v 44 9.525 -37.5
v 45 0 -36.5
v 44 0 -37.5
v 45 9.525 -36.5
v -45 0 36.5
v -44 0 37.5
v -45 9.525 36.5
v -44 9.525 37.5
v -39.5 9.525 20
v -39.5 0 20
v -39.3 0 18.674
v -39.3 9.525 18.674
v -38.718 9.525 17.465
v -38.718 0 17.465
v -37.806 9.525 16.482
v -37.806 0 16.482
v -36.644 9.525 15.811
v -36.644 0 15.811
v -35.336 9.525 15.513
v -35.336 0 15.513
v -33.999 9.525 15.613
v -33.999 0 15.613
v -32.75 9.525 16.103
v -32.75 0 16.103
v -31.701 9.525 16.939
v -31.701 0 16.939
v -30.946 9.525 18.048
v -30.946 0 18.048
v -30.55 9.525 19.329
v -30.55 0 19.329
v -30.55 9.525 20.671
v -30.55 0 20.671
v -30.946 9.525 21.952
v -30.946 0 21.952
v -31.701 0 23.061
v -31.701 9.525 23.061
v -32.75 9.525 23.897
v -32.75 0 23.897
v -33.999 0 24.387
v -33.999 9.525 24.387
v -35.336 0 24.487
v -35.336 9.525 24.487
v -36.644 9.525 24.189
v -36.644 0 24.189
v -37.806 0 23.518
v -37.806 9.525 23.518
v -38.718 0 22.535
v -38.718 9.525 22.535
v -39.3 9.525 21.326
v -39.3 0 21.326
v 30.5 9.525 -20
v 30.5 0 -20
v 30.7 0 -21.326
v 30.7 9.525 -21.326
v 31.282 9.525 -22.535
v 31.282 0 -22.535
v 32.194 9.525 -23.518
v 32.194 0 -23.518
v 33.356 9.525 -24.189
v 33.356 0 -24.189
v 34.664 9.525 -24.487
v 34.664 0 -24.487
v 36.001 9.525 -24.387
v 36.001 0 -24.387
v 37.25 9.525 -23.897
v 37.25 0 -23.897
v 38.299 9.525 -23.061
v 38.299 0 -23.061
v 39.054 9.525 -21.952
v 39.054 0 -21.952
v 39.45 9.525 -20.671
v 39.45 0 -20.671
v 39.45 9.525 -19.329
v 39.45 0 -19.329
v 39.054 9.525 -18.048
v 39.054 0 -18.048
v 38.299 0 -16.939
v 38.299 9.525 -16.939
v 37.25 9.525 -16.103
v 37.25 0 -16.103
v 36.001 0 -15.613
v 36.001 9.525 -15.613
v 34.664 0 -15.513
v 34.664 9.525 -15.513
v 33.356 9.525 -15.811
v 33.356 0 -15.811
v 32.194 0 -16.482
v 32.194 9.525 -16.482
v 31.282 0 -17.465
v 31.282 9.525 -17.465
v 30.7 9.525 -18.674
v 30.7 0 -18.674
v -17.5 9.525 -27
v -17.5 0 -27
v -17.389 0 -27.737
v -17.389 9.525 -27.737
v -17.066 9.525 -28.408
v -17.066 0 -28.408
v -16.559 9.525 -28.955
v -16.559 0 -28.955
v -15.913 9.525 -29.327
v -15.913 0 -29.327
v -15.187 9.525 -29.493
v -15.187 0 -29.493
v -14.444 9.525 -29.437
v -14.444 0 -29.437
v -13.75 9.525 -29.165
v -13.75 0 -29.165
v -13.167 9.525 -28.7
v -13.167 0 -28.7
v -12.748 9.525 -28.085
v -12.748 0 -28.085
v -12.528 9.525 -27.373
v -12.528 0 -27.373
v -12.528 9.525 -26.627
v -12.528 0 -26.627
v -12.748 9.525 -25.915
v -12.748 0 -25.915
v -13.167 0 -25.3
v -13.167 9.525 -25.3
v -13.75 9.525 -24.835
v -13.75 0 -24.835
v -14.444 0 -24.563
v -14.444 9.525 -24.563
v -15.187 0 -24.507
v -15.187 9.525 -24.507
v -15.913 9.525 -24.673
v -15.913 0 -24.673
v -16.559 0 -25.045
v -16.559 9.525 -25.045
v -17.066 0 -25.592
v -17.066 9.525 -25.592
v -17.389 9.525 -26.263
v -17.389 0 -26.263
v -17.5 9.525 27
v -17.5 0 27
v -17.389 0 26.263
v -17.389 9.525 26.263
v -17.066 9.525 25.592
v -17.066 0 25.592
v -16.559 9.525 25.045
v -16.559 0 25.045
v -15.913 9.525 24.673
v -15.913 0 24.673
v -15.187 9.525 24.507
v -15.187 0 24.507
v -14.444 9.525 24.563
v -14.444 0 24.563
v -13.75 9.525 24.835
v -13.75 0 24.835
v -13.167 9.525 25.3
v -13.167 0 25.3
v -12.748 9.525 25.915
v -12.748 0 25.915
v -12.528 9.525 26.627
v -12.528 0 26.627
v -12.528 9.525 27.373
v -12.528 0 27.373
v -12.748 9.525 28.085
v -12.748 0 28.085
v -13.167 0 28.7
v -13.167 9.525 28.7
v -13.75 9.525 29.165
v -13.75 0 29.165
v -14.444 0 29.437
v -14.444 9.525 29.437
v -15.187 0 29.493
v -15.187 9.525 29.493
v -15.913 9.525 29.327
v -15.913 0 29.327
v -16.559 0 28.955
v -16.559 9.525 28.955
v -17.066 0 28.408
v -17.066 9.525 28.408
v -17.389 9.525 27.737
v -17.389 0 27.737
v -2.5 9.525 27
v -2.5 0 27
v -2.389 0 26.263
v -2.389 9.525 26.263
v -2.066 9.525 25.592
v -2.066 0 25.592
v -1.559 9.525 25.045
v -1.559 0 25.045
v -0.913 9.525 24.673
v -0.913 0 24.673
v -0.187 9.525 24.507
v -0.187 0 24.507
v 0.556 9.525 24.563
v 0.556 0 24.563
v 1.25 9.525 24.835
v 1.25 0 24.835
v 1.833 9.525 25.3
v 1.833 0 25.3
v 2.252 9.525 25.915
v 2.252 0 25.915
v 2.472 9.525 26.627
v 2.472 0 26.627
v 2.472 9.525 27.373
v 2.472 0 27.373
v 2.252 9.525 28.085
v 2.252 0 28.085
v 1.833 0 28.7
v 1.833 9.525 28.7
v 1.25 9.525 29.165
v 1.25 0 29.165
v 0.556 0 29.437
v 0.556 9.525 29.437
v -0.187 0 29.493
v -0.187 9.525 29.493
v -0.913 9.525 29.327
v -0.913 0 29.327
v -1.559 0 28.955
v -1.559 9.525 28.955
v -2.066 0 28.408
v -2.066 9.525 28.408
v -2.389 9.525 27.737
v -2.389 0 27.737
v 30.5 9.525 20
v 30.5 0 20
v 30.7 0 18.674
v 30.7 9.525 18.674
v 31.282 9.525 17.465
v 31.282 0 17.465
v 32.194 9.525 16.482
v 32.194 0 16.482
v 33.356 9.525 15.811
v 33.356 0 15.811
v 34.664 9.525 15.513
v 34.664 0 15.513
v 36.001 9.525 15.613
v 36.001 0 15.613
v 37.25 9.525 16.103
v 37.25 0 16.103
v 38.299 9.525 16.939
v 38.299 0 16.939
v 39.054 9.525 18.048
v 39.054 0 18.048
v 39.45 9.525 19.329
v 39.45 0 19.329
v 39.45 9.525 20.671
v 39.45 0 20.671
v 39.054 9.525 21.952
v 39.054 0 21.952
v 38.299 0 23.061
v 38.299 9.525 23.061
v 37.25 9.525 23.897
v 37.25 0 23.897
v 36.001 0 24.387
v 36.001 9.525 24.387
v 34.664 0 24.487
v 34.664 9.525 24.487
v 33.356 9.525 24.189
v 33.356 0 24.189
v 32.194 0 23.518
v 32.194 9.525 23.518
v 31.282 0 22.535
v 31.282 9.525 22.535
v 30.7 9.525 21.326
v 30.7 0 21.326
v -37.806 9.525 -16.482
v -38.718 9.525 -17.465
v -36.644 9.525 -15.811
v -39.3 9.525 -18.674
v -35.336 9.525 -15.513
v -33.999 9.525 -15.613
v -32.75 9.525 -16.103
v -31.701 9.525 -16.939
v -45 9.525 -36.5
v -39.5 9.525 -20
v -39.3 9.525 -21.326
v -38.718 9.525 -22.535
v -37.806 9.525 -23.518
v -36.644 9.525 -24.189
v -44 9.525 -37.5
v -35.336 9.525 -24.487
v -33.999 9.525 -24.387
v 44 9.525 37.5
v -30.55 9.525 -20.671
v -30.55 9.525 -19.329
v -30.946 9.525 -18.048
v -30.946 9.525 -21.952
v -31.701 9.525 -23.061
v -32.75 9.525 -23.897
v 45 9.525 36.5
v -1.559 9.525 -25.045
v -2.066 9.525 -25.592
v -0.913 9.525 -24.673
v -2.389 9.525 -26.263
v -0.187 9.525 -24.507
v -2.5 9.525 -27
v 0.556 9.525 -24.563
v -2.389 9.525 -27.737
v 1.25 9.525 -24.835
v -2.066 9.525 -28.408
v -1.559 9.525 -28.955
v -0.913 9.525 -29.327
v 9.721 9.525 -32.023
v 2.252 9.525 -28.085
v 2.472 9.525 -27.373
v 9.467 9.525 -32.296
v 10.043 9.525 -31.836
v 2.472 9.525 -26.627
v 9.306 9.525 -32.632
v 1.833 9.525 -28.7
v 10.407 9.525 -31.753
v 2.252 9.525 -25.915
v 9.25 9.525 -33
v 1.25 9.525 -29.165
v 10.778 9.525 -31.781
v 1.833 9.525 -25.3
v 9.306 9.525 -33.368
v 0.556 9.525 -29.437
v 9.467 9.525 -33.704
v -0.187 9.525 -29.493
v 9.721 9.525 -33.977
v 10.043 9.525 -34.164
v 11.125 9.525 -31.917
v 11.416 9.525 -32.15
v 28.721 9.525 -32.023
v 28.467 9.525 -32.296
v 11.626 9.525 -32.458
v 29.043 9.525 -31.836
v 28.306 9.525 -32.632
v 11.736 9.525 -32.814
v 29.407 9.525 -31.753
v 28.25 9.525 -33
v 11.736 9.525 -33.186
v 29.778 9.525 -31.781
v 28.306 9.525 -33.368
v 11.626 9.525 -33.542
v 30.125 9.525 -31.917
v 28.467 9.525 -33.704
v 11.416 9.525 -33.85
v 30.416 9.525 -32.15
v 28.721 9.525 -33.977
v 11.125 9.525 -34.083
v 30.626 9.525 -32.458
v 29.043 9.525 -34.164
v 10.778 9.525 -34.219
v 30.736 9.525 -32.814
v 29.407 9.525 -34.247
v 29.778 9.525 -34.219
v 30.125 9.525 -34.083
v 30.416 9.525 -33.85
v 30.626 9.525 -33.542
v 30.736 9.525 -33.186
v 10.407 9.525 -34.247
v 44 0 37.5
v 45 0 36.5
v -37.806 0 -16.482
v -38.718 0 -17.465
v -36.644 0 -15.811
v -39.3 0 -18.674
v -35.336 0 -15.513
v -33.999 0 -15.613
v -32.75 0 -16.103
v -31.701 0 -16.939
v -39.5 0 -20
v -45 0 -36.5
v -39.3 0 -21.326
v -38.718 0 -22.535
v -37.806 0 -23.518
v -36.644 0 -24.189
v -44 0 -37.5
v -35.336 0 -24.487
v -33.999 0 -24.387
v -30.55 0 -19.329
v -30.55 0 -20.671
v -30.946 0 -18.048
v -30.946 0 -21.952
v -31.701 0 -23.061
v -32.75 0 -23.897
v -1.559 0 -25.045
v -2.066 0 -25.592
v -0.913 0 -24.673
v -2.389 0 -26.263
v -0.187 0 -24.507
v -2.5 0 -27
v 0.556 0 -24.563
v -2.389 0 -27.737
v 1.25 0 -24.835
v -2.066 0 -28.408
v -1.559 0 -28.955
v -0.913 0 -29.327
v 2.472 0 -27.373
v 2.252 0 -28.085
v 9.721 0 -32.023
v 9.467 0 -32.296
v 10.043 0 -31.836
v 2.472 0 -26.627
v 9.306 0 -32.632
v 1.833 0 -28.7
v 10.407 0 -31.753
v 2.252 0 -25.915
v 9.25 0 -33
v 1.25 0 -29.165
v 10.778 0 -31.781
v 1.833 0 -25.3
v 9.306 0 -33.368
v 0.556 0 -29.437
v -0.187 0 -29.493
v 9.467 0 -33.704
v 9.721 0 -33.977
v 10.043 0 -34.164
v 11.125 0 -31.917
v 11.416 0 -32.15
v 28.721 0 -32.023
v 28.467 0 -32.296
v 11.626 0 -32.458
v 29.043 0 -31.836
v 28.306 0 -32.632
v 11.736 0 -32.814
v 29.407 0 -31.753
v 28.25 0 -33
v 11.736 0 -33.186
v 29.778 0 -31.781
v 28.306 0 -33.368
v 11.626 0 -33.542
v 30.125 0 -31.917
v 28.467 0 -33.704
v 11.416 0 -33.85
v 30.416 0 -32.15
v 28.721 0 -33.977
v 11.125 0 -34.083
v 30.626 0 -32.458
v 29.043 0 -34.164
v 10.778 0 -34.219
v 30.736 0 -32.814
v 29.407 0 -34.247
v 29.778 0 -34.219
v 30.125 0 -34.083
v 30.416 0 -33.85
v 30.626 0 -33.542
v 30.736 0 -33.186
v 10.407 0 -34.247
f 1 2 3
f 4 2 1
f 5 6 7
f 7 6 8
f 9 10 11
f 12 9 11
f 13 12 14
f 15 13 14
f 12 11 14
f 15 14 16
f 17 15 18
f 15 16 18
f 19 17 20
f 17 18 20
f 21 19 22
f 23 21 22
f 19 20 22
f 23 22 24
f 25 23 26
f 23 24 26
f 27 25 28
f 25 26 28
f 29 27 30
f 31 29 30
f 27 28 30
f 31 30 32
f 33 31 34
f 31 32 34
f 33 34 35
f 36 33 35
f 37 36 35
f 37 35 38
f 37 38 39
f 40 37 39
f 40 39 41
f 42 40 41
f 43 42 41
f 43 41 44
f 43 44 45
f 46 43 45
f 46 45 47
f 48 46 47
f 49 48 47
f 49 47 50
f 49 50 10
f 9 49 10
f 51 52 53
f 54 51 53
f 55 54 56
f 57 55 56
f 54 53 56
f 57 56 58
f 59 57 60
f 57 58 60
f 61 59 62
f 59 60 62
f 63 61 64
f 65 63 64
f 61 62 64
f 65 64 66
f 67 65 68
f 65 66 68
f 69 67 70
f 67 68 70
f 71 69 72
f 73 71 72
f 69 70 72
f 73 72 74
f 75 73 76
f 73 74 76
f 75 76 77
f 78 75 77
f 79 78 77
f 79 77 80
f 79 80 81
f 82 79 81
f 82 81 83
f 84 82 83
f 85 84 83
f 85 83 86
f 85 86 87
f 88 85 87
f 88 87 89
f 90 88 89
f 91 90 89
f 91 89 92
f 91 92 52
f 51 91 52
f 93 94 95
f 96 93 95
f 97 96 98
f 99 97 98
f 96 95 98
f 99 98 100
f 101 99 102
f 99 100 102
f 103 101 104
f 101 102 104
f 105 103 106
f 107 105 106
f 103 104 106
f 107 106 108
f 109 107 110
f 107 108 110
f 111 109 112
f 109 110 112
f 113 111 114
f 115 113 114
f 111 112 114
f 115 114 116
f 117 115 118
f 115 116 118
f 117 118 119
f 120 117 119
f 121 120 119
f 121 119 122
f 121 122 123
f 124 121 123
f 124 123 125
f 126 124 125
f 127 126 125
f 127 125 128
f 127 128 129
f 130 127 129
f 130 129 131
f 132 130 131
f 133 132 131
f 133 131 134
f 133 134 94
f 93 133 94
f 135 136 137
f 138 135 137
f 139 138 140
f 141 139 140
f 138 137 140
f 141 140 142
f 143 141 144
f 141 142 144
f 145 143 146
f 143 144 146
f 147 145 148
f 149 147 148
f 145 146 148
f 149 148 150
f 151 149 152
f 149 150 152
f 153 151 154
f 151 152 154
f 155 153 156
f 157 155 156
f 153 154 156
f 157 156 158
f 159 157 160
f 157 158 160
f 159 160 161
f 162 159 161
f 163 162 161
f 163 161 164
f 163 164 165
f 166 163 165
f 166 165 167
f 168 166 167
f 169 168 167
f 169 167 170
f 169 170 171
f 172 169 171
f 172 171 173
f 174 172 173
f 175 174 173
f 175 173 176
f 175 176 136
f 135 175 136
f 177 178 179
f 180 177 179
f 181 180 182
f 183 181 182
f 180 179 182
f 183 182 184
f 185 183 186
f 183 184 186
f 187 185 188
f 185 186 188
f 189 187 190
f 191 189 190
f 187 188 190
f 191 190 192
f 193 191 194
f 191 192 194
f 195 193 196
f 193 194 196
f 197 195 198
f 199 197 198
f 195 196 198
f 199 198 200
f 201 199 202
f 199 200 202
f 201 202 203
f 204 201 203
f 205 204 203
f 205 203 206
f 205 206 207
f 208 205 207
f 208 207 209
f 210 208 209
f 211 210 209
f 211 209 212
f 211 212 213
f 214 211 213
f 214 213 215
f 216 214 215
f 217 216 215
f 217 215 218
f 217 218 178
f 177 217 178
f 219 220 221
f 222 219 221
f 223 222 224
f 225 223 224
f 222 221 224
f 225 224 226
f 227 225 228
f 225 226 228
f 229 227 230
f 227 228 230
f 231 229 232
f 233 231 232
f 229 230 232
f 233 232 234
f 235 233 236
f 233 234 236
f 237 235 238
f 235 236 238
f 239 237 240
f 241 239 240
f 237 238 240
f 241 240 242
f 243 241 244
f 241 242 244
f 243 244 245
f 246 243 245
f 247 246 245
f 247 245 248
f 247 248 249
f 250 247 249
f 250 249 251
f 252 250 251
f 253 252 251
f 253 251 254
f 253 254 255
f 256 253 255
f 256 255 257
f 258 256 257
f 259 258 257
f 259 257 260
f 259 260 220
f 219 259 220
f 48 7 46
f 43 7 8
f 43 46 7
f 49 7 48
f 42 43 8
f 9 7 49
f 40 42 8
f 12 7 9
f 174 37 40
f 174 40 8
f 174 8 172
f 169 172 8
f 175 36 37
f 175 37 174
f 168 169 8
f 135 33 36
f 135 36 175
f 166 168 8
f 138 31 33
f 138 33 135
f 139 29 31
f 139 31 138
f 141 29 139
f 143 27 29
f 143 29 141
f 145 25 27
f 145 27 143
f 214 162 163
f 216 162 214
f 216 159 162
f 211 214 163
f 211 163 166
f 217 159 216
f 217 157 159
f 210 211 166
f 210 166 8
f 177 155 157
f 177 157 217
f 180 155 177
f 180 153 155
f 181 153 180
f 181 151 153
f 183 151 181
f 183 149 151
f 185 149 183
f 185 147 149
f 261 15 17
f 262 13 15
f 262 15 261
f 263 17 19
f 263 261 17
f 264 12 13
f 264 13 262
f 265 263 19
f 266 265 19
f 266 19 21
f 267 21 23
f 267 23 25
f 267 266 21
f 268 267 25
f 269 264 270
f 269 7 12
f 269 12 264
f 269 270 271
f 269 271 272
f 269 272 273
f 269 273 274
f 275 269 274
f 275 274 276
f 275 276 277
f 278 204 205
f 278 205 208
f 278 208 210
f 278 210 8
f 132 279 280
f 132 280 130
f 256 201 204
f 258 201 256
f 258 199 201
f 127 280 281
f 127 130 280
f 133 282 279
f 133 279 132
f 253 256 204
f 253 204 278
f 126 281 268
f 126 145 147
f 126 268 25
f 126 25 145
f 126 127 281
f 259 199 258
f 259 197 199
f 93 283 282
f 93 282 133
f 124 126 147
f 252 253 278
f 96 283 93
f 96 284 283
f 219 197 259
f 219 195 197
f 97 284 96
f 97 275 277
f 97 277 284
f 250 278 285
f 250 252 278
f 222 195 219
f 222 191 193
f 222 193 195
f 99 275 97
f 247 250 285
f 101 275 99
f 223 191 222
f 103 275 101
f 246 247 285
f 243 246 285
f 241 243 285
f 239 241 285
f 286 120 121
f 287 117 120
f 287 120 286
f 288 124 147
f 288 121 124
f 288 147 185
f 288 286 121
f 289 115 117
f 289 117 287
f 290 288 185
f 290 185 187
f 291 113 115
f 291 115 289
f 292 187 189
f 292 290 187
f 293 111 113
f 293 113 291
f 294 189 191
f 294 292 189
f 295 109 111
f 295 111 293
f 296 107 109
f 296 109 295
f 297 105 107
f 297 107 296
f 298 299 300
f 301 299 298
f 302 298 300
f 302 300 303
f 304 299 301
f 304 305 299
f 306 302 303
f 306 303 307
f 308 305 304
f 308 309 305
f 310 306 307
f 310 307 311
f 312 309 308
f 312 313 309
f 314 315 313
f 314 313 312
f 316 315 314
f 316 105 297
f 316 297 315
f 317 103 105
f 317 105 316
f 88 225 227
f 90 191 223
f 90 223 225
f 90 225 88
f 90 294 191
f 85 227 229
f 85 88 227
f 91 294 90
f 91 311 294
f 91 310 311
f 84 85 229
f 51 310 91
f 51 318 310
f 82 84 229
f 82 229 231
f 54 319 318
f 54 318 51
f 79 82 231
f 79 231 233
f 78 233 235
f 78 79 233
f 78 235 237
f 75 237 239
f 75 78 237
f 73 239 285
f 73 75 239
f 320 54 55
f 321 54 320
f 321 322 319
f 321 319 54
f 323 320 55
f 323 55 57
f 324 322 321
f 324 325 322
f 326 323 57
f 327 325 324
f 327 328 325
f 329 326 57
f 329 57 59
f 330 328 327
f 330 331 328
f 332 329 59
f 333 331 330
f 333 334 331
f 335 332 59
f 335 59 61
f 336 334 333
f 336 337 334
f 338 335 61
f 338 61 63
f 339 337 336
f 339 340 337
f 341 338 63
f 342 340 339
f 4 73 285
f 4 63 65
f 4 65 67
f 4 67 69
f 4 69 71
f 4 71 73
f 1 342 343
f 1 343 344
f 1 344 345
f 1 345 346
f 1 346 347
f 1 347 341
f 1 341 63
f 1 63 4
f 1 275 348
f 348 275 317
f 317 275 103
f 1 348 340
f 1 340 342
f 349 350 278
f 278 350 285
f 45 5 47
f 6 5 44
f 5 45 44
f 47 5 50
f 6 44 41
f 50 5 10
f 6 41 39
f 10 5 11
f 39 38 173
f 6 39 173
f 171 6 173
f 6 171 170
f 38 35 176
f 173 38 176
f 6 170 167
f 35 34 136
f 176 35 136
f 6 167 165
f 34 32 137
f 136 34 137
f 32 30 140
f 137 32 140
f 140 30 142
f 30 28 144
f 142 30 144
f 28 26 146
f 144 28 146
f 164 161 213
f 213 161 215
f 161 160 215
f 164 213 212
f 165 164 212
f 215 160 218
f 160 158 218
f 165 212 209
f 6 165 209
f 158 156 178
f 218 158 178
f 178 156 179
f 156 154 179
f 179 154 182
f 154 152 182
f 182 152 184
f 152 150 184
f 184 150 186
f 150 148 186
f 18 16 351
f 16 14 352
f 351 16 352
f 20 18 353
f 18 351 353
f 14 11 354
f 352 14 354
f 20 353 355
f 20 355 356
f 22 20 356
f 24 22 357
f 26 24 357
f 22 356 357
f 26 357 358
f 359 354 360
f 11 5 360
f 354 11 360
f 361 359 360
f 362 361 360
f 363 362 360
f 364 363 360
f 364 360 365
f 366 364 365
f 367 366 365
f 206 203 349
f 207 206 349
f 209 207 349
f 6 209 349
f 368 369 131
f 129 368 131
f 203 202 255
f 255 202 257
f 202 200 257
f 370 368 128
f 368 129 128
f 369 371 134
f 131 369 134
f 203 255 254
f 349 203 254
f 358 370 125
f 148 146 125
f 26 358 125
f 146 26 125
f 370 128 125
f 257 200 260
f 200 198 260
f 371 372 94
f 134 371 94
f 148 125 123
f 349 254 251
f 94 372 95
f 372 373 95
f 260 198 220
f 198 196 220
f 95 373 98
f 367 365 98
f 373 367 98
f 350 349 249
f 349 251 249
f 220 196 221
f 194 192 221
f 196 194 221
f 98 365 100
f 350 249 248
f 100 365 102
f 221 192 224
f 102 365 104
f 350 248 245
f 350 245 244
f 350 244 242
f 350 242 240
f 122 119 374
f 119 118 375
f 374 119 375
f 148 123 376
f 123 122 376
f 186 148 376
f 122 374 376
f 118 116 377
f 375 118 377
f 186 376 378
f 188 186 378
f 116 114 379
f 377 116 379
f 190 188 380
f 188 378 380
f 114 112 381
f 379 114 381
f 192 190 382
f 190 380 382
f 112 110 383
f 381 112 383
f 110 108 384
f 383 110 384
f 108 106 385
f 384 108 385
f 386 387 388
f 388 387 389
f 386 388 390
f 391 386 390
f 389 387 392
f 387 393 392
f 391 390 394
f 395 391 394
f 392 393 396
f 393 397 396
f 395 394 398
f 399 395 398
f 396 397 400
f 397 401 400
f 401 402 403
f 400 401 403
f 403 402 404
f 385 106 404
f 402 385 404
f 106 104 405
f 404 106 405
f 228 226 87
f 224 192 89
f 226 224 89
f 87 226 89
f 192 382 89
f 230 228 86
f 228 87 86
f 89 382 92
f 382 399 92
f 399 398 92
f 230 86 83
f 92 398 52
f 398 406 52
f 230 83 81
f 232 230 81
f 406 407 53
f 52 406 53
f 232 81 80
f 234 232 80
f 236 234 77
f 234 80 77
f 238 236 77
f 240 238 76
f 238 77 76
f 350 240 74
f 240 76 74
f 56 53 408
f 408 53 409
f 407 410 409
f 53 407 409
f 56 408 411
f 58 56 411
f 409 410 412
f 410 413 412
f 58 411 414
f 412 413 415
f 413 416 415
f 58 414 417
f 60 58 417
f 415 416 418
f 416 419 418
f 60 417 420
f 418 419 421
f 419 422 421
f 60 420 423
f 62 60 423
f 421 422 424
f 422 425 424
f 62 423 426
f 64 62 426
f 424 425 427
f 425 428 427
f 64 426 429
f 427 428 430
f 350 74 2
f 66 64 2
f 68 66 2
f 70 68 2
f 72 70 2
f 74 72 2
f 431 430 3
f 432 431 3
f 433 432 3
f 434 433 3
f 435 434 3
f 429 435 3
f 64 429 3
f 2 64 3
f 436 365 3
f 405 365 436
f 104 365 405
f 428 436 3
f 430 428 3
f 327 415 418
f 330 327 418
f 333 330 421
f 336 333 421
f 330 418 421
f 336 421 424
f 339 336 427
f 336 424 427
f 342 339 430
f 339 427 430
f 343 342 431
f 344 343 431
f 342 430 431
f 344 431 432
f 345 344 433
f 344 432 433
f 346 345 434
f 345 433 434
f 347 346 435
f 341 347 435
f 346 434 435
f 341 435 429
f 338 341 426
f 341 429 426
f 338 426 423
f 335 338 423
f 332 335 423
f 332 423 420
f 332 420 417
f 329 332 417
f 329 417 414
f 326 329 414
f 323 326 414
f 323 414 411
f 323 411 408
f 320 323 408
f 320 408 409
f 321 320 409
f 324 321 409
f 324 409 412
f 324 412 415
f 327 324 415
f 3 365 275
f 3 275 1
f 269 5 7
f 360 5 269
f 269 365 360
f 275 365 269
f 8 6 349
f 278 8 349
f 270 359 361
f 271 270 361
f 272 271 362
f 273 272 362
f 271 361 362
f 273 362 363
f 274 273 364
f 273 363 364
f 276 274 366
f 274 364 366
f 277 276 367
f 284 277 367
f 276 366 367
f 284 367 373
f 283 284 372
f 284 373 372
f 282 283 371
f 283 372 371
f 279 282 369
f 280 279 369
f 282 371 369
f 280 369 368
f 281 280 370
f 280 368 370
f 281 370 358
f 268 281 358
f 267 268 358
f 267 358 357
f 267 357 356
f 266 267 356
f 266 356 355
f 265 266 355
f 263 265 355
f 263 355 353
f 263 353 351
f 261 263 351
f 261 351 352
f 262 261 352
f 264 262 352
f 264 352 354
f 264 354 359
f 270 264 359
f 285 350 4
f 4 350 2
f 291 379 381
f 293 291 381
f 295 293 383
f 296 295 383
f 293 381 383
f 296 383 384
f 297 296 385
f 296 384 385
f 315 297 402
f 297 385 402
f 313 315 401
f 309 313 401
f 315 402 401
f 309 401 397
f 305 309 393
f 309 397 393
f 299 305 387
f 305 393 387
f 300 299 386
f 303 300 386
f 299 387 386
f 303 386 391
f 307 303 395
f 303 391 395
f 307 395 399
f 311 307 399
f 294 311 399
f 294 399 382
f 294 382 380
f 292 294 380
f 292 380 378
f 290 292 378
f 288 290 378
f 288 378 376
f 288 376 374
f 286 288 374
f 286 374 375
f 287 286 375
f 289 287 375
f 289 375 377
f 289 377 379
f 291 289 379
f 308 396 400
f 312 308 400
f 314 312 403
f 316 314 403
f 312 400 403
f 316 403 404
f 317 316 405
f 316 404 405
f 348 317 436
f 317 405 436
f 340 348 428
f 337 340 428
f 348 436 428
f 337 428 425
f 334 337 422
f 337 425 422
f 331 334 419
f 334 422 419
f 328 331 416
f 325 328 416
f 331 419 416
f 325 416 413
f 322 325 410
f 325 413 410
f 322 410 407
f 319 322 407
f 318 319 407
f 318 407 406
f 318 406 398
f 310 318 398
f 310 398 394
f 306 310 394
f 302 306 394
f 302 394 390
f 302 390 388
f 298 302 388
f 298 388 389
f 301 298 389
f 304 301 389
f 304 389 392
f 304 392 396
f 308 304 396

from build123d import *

# Parameters (mm, degrees)
SKETCH1_W                   = 90
SKETCH1_H                   = 75
BOSS_EXTRUDE1_DEPTH         = 9.525
M8_CLEARANCE_HOLE1_D        = 9
FIXED_M6X1_0_TAPPED_HOLE1_D = 5
M3X0_5_TAPPED_HOLE1_D       = 2.5
CHAMFER1_SIZE               = 1


with BuildPart() as part:
    # Sketch1 → Boss-Extrude1 (new body)
    with BuildSketch(Plane(origin=(0, 0, 0), x_dir=(1, 0, 0), z_dir=(0, 1, 0))):
        Rectangle(SKETCH1_W, SKETCH1_H)
    extrude(amount=BOSS_EXTRUDE1_DEPTH)

    # M8 Clearance Hole1 (through all)
    with Locations(Plane(origin=(0, 9.525, 0), x_dir=(1, 0, 0), z_dir=(0, 1, 0))):
        with Locations((-35, 20), (35, 20), (35, -20), (-35, -20)):
            Hole(M8_CLEARANCE_HOLE1_D / 2)

    # Fixed M6x1.0 Tapped Hole1 (through all)
    with Locations(Plane(origin=(0, 9.525, 0), x_dir=(1, 0, 0), z_dir=(0, 1, 0))):
        with Locations((-15, 27), (0, 27), (0, -27), (-15, -27)):
            Hole(FIXED_M6X1_0_TAPPED_HOLE1_D / 2)

    # M3x0.5 Tapped Hole1 (through all)
    with Locations(Plane(origin=(0, 9.525, 0), x_dir=(1, 0, 0), z_dir=(0, 1, 0))):
        with Locations((10.5, 33), (29.5, 33)):
            Hole(M3X0_5_TAPPED_HOLE1_D / 2)

    # Chamfer1
    chamfer1_edges = [part.edges().sort_by_distance(p)[0] for p in [
        (45, 4.7625, 37.5),
        (-45, 4.7625, 37.5),
        (-45, 4.7625, -37.5),
        (45, 4.7625, -37.5),
    ]]
    chamfer(chamfer1_edges, length=CHAMFER1_SIZE)


solid = part.part
